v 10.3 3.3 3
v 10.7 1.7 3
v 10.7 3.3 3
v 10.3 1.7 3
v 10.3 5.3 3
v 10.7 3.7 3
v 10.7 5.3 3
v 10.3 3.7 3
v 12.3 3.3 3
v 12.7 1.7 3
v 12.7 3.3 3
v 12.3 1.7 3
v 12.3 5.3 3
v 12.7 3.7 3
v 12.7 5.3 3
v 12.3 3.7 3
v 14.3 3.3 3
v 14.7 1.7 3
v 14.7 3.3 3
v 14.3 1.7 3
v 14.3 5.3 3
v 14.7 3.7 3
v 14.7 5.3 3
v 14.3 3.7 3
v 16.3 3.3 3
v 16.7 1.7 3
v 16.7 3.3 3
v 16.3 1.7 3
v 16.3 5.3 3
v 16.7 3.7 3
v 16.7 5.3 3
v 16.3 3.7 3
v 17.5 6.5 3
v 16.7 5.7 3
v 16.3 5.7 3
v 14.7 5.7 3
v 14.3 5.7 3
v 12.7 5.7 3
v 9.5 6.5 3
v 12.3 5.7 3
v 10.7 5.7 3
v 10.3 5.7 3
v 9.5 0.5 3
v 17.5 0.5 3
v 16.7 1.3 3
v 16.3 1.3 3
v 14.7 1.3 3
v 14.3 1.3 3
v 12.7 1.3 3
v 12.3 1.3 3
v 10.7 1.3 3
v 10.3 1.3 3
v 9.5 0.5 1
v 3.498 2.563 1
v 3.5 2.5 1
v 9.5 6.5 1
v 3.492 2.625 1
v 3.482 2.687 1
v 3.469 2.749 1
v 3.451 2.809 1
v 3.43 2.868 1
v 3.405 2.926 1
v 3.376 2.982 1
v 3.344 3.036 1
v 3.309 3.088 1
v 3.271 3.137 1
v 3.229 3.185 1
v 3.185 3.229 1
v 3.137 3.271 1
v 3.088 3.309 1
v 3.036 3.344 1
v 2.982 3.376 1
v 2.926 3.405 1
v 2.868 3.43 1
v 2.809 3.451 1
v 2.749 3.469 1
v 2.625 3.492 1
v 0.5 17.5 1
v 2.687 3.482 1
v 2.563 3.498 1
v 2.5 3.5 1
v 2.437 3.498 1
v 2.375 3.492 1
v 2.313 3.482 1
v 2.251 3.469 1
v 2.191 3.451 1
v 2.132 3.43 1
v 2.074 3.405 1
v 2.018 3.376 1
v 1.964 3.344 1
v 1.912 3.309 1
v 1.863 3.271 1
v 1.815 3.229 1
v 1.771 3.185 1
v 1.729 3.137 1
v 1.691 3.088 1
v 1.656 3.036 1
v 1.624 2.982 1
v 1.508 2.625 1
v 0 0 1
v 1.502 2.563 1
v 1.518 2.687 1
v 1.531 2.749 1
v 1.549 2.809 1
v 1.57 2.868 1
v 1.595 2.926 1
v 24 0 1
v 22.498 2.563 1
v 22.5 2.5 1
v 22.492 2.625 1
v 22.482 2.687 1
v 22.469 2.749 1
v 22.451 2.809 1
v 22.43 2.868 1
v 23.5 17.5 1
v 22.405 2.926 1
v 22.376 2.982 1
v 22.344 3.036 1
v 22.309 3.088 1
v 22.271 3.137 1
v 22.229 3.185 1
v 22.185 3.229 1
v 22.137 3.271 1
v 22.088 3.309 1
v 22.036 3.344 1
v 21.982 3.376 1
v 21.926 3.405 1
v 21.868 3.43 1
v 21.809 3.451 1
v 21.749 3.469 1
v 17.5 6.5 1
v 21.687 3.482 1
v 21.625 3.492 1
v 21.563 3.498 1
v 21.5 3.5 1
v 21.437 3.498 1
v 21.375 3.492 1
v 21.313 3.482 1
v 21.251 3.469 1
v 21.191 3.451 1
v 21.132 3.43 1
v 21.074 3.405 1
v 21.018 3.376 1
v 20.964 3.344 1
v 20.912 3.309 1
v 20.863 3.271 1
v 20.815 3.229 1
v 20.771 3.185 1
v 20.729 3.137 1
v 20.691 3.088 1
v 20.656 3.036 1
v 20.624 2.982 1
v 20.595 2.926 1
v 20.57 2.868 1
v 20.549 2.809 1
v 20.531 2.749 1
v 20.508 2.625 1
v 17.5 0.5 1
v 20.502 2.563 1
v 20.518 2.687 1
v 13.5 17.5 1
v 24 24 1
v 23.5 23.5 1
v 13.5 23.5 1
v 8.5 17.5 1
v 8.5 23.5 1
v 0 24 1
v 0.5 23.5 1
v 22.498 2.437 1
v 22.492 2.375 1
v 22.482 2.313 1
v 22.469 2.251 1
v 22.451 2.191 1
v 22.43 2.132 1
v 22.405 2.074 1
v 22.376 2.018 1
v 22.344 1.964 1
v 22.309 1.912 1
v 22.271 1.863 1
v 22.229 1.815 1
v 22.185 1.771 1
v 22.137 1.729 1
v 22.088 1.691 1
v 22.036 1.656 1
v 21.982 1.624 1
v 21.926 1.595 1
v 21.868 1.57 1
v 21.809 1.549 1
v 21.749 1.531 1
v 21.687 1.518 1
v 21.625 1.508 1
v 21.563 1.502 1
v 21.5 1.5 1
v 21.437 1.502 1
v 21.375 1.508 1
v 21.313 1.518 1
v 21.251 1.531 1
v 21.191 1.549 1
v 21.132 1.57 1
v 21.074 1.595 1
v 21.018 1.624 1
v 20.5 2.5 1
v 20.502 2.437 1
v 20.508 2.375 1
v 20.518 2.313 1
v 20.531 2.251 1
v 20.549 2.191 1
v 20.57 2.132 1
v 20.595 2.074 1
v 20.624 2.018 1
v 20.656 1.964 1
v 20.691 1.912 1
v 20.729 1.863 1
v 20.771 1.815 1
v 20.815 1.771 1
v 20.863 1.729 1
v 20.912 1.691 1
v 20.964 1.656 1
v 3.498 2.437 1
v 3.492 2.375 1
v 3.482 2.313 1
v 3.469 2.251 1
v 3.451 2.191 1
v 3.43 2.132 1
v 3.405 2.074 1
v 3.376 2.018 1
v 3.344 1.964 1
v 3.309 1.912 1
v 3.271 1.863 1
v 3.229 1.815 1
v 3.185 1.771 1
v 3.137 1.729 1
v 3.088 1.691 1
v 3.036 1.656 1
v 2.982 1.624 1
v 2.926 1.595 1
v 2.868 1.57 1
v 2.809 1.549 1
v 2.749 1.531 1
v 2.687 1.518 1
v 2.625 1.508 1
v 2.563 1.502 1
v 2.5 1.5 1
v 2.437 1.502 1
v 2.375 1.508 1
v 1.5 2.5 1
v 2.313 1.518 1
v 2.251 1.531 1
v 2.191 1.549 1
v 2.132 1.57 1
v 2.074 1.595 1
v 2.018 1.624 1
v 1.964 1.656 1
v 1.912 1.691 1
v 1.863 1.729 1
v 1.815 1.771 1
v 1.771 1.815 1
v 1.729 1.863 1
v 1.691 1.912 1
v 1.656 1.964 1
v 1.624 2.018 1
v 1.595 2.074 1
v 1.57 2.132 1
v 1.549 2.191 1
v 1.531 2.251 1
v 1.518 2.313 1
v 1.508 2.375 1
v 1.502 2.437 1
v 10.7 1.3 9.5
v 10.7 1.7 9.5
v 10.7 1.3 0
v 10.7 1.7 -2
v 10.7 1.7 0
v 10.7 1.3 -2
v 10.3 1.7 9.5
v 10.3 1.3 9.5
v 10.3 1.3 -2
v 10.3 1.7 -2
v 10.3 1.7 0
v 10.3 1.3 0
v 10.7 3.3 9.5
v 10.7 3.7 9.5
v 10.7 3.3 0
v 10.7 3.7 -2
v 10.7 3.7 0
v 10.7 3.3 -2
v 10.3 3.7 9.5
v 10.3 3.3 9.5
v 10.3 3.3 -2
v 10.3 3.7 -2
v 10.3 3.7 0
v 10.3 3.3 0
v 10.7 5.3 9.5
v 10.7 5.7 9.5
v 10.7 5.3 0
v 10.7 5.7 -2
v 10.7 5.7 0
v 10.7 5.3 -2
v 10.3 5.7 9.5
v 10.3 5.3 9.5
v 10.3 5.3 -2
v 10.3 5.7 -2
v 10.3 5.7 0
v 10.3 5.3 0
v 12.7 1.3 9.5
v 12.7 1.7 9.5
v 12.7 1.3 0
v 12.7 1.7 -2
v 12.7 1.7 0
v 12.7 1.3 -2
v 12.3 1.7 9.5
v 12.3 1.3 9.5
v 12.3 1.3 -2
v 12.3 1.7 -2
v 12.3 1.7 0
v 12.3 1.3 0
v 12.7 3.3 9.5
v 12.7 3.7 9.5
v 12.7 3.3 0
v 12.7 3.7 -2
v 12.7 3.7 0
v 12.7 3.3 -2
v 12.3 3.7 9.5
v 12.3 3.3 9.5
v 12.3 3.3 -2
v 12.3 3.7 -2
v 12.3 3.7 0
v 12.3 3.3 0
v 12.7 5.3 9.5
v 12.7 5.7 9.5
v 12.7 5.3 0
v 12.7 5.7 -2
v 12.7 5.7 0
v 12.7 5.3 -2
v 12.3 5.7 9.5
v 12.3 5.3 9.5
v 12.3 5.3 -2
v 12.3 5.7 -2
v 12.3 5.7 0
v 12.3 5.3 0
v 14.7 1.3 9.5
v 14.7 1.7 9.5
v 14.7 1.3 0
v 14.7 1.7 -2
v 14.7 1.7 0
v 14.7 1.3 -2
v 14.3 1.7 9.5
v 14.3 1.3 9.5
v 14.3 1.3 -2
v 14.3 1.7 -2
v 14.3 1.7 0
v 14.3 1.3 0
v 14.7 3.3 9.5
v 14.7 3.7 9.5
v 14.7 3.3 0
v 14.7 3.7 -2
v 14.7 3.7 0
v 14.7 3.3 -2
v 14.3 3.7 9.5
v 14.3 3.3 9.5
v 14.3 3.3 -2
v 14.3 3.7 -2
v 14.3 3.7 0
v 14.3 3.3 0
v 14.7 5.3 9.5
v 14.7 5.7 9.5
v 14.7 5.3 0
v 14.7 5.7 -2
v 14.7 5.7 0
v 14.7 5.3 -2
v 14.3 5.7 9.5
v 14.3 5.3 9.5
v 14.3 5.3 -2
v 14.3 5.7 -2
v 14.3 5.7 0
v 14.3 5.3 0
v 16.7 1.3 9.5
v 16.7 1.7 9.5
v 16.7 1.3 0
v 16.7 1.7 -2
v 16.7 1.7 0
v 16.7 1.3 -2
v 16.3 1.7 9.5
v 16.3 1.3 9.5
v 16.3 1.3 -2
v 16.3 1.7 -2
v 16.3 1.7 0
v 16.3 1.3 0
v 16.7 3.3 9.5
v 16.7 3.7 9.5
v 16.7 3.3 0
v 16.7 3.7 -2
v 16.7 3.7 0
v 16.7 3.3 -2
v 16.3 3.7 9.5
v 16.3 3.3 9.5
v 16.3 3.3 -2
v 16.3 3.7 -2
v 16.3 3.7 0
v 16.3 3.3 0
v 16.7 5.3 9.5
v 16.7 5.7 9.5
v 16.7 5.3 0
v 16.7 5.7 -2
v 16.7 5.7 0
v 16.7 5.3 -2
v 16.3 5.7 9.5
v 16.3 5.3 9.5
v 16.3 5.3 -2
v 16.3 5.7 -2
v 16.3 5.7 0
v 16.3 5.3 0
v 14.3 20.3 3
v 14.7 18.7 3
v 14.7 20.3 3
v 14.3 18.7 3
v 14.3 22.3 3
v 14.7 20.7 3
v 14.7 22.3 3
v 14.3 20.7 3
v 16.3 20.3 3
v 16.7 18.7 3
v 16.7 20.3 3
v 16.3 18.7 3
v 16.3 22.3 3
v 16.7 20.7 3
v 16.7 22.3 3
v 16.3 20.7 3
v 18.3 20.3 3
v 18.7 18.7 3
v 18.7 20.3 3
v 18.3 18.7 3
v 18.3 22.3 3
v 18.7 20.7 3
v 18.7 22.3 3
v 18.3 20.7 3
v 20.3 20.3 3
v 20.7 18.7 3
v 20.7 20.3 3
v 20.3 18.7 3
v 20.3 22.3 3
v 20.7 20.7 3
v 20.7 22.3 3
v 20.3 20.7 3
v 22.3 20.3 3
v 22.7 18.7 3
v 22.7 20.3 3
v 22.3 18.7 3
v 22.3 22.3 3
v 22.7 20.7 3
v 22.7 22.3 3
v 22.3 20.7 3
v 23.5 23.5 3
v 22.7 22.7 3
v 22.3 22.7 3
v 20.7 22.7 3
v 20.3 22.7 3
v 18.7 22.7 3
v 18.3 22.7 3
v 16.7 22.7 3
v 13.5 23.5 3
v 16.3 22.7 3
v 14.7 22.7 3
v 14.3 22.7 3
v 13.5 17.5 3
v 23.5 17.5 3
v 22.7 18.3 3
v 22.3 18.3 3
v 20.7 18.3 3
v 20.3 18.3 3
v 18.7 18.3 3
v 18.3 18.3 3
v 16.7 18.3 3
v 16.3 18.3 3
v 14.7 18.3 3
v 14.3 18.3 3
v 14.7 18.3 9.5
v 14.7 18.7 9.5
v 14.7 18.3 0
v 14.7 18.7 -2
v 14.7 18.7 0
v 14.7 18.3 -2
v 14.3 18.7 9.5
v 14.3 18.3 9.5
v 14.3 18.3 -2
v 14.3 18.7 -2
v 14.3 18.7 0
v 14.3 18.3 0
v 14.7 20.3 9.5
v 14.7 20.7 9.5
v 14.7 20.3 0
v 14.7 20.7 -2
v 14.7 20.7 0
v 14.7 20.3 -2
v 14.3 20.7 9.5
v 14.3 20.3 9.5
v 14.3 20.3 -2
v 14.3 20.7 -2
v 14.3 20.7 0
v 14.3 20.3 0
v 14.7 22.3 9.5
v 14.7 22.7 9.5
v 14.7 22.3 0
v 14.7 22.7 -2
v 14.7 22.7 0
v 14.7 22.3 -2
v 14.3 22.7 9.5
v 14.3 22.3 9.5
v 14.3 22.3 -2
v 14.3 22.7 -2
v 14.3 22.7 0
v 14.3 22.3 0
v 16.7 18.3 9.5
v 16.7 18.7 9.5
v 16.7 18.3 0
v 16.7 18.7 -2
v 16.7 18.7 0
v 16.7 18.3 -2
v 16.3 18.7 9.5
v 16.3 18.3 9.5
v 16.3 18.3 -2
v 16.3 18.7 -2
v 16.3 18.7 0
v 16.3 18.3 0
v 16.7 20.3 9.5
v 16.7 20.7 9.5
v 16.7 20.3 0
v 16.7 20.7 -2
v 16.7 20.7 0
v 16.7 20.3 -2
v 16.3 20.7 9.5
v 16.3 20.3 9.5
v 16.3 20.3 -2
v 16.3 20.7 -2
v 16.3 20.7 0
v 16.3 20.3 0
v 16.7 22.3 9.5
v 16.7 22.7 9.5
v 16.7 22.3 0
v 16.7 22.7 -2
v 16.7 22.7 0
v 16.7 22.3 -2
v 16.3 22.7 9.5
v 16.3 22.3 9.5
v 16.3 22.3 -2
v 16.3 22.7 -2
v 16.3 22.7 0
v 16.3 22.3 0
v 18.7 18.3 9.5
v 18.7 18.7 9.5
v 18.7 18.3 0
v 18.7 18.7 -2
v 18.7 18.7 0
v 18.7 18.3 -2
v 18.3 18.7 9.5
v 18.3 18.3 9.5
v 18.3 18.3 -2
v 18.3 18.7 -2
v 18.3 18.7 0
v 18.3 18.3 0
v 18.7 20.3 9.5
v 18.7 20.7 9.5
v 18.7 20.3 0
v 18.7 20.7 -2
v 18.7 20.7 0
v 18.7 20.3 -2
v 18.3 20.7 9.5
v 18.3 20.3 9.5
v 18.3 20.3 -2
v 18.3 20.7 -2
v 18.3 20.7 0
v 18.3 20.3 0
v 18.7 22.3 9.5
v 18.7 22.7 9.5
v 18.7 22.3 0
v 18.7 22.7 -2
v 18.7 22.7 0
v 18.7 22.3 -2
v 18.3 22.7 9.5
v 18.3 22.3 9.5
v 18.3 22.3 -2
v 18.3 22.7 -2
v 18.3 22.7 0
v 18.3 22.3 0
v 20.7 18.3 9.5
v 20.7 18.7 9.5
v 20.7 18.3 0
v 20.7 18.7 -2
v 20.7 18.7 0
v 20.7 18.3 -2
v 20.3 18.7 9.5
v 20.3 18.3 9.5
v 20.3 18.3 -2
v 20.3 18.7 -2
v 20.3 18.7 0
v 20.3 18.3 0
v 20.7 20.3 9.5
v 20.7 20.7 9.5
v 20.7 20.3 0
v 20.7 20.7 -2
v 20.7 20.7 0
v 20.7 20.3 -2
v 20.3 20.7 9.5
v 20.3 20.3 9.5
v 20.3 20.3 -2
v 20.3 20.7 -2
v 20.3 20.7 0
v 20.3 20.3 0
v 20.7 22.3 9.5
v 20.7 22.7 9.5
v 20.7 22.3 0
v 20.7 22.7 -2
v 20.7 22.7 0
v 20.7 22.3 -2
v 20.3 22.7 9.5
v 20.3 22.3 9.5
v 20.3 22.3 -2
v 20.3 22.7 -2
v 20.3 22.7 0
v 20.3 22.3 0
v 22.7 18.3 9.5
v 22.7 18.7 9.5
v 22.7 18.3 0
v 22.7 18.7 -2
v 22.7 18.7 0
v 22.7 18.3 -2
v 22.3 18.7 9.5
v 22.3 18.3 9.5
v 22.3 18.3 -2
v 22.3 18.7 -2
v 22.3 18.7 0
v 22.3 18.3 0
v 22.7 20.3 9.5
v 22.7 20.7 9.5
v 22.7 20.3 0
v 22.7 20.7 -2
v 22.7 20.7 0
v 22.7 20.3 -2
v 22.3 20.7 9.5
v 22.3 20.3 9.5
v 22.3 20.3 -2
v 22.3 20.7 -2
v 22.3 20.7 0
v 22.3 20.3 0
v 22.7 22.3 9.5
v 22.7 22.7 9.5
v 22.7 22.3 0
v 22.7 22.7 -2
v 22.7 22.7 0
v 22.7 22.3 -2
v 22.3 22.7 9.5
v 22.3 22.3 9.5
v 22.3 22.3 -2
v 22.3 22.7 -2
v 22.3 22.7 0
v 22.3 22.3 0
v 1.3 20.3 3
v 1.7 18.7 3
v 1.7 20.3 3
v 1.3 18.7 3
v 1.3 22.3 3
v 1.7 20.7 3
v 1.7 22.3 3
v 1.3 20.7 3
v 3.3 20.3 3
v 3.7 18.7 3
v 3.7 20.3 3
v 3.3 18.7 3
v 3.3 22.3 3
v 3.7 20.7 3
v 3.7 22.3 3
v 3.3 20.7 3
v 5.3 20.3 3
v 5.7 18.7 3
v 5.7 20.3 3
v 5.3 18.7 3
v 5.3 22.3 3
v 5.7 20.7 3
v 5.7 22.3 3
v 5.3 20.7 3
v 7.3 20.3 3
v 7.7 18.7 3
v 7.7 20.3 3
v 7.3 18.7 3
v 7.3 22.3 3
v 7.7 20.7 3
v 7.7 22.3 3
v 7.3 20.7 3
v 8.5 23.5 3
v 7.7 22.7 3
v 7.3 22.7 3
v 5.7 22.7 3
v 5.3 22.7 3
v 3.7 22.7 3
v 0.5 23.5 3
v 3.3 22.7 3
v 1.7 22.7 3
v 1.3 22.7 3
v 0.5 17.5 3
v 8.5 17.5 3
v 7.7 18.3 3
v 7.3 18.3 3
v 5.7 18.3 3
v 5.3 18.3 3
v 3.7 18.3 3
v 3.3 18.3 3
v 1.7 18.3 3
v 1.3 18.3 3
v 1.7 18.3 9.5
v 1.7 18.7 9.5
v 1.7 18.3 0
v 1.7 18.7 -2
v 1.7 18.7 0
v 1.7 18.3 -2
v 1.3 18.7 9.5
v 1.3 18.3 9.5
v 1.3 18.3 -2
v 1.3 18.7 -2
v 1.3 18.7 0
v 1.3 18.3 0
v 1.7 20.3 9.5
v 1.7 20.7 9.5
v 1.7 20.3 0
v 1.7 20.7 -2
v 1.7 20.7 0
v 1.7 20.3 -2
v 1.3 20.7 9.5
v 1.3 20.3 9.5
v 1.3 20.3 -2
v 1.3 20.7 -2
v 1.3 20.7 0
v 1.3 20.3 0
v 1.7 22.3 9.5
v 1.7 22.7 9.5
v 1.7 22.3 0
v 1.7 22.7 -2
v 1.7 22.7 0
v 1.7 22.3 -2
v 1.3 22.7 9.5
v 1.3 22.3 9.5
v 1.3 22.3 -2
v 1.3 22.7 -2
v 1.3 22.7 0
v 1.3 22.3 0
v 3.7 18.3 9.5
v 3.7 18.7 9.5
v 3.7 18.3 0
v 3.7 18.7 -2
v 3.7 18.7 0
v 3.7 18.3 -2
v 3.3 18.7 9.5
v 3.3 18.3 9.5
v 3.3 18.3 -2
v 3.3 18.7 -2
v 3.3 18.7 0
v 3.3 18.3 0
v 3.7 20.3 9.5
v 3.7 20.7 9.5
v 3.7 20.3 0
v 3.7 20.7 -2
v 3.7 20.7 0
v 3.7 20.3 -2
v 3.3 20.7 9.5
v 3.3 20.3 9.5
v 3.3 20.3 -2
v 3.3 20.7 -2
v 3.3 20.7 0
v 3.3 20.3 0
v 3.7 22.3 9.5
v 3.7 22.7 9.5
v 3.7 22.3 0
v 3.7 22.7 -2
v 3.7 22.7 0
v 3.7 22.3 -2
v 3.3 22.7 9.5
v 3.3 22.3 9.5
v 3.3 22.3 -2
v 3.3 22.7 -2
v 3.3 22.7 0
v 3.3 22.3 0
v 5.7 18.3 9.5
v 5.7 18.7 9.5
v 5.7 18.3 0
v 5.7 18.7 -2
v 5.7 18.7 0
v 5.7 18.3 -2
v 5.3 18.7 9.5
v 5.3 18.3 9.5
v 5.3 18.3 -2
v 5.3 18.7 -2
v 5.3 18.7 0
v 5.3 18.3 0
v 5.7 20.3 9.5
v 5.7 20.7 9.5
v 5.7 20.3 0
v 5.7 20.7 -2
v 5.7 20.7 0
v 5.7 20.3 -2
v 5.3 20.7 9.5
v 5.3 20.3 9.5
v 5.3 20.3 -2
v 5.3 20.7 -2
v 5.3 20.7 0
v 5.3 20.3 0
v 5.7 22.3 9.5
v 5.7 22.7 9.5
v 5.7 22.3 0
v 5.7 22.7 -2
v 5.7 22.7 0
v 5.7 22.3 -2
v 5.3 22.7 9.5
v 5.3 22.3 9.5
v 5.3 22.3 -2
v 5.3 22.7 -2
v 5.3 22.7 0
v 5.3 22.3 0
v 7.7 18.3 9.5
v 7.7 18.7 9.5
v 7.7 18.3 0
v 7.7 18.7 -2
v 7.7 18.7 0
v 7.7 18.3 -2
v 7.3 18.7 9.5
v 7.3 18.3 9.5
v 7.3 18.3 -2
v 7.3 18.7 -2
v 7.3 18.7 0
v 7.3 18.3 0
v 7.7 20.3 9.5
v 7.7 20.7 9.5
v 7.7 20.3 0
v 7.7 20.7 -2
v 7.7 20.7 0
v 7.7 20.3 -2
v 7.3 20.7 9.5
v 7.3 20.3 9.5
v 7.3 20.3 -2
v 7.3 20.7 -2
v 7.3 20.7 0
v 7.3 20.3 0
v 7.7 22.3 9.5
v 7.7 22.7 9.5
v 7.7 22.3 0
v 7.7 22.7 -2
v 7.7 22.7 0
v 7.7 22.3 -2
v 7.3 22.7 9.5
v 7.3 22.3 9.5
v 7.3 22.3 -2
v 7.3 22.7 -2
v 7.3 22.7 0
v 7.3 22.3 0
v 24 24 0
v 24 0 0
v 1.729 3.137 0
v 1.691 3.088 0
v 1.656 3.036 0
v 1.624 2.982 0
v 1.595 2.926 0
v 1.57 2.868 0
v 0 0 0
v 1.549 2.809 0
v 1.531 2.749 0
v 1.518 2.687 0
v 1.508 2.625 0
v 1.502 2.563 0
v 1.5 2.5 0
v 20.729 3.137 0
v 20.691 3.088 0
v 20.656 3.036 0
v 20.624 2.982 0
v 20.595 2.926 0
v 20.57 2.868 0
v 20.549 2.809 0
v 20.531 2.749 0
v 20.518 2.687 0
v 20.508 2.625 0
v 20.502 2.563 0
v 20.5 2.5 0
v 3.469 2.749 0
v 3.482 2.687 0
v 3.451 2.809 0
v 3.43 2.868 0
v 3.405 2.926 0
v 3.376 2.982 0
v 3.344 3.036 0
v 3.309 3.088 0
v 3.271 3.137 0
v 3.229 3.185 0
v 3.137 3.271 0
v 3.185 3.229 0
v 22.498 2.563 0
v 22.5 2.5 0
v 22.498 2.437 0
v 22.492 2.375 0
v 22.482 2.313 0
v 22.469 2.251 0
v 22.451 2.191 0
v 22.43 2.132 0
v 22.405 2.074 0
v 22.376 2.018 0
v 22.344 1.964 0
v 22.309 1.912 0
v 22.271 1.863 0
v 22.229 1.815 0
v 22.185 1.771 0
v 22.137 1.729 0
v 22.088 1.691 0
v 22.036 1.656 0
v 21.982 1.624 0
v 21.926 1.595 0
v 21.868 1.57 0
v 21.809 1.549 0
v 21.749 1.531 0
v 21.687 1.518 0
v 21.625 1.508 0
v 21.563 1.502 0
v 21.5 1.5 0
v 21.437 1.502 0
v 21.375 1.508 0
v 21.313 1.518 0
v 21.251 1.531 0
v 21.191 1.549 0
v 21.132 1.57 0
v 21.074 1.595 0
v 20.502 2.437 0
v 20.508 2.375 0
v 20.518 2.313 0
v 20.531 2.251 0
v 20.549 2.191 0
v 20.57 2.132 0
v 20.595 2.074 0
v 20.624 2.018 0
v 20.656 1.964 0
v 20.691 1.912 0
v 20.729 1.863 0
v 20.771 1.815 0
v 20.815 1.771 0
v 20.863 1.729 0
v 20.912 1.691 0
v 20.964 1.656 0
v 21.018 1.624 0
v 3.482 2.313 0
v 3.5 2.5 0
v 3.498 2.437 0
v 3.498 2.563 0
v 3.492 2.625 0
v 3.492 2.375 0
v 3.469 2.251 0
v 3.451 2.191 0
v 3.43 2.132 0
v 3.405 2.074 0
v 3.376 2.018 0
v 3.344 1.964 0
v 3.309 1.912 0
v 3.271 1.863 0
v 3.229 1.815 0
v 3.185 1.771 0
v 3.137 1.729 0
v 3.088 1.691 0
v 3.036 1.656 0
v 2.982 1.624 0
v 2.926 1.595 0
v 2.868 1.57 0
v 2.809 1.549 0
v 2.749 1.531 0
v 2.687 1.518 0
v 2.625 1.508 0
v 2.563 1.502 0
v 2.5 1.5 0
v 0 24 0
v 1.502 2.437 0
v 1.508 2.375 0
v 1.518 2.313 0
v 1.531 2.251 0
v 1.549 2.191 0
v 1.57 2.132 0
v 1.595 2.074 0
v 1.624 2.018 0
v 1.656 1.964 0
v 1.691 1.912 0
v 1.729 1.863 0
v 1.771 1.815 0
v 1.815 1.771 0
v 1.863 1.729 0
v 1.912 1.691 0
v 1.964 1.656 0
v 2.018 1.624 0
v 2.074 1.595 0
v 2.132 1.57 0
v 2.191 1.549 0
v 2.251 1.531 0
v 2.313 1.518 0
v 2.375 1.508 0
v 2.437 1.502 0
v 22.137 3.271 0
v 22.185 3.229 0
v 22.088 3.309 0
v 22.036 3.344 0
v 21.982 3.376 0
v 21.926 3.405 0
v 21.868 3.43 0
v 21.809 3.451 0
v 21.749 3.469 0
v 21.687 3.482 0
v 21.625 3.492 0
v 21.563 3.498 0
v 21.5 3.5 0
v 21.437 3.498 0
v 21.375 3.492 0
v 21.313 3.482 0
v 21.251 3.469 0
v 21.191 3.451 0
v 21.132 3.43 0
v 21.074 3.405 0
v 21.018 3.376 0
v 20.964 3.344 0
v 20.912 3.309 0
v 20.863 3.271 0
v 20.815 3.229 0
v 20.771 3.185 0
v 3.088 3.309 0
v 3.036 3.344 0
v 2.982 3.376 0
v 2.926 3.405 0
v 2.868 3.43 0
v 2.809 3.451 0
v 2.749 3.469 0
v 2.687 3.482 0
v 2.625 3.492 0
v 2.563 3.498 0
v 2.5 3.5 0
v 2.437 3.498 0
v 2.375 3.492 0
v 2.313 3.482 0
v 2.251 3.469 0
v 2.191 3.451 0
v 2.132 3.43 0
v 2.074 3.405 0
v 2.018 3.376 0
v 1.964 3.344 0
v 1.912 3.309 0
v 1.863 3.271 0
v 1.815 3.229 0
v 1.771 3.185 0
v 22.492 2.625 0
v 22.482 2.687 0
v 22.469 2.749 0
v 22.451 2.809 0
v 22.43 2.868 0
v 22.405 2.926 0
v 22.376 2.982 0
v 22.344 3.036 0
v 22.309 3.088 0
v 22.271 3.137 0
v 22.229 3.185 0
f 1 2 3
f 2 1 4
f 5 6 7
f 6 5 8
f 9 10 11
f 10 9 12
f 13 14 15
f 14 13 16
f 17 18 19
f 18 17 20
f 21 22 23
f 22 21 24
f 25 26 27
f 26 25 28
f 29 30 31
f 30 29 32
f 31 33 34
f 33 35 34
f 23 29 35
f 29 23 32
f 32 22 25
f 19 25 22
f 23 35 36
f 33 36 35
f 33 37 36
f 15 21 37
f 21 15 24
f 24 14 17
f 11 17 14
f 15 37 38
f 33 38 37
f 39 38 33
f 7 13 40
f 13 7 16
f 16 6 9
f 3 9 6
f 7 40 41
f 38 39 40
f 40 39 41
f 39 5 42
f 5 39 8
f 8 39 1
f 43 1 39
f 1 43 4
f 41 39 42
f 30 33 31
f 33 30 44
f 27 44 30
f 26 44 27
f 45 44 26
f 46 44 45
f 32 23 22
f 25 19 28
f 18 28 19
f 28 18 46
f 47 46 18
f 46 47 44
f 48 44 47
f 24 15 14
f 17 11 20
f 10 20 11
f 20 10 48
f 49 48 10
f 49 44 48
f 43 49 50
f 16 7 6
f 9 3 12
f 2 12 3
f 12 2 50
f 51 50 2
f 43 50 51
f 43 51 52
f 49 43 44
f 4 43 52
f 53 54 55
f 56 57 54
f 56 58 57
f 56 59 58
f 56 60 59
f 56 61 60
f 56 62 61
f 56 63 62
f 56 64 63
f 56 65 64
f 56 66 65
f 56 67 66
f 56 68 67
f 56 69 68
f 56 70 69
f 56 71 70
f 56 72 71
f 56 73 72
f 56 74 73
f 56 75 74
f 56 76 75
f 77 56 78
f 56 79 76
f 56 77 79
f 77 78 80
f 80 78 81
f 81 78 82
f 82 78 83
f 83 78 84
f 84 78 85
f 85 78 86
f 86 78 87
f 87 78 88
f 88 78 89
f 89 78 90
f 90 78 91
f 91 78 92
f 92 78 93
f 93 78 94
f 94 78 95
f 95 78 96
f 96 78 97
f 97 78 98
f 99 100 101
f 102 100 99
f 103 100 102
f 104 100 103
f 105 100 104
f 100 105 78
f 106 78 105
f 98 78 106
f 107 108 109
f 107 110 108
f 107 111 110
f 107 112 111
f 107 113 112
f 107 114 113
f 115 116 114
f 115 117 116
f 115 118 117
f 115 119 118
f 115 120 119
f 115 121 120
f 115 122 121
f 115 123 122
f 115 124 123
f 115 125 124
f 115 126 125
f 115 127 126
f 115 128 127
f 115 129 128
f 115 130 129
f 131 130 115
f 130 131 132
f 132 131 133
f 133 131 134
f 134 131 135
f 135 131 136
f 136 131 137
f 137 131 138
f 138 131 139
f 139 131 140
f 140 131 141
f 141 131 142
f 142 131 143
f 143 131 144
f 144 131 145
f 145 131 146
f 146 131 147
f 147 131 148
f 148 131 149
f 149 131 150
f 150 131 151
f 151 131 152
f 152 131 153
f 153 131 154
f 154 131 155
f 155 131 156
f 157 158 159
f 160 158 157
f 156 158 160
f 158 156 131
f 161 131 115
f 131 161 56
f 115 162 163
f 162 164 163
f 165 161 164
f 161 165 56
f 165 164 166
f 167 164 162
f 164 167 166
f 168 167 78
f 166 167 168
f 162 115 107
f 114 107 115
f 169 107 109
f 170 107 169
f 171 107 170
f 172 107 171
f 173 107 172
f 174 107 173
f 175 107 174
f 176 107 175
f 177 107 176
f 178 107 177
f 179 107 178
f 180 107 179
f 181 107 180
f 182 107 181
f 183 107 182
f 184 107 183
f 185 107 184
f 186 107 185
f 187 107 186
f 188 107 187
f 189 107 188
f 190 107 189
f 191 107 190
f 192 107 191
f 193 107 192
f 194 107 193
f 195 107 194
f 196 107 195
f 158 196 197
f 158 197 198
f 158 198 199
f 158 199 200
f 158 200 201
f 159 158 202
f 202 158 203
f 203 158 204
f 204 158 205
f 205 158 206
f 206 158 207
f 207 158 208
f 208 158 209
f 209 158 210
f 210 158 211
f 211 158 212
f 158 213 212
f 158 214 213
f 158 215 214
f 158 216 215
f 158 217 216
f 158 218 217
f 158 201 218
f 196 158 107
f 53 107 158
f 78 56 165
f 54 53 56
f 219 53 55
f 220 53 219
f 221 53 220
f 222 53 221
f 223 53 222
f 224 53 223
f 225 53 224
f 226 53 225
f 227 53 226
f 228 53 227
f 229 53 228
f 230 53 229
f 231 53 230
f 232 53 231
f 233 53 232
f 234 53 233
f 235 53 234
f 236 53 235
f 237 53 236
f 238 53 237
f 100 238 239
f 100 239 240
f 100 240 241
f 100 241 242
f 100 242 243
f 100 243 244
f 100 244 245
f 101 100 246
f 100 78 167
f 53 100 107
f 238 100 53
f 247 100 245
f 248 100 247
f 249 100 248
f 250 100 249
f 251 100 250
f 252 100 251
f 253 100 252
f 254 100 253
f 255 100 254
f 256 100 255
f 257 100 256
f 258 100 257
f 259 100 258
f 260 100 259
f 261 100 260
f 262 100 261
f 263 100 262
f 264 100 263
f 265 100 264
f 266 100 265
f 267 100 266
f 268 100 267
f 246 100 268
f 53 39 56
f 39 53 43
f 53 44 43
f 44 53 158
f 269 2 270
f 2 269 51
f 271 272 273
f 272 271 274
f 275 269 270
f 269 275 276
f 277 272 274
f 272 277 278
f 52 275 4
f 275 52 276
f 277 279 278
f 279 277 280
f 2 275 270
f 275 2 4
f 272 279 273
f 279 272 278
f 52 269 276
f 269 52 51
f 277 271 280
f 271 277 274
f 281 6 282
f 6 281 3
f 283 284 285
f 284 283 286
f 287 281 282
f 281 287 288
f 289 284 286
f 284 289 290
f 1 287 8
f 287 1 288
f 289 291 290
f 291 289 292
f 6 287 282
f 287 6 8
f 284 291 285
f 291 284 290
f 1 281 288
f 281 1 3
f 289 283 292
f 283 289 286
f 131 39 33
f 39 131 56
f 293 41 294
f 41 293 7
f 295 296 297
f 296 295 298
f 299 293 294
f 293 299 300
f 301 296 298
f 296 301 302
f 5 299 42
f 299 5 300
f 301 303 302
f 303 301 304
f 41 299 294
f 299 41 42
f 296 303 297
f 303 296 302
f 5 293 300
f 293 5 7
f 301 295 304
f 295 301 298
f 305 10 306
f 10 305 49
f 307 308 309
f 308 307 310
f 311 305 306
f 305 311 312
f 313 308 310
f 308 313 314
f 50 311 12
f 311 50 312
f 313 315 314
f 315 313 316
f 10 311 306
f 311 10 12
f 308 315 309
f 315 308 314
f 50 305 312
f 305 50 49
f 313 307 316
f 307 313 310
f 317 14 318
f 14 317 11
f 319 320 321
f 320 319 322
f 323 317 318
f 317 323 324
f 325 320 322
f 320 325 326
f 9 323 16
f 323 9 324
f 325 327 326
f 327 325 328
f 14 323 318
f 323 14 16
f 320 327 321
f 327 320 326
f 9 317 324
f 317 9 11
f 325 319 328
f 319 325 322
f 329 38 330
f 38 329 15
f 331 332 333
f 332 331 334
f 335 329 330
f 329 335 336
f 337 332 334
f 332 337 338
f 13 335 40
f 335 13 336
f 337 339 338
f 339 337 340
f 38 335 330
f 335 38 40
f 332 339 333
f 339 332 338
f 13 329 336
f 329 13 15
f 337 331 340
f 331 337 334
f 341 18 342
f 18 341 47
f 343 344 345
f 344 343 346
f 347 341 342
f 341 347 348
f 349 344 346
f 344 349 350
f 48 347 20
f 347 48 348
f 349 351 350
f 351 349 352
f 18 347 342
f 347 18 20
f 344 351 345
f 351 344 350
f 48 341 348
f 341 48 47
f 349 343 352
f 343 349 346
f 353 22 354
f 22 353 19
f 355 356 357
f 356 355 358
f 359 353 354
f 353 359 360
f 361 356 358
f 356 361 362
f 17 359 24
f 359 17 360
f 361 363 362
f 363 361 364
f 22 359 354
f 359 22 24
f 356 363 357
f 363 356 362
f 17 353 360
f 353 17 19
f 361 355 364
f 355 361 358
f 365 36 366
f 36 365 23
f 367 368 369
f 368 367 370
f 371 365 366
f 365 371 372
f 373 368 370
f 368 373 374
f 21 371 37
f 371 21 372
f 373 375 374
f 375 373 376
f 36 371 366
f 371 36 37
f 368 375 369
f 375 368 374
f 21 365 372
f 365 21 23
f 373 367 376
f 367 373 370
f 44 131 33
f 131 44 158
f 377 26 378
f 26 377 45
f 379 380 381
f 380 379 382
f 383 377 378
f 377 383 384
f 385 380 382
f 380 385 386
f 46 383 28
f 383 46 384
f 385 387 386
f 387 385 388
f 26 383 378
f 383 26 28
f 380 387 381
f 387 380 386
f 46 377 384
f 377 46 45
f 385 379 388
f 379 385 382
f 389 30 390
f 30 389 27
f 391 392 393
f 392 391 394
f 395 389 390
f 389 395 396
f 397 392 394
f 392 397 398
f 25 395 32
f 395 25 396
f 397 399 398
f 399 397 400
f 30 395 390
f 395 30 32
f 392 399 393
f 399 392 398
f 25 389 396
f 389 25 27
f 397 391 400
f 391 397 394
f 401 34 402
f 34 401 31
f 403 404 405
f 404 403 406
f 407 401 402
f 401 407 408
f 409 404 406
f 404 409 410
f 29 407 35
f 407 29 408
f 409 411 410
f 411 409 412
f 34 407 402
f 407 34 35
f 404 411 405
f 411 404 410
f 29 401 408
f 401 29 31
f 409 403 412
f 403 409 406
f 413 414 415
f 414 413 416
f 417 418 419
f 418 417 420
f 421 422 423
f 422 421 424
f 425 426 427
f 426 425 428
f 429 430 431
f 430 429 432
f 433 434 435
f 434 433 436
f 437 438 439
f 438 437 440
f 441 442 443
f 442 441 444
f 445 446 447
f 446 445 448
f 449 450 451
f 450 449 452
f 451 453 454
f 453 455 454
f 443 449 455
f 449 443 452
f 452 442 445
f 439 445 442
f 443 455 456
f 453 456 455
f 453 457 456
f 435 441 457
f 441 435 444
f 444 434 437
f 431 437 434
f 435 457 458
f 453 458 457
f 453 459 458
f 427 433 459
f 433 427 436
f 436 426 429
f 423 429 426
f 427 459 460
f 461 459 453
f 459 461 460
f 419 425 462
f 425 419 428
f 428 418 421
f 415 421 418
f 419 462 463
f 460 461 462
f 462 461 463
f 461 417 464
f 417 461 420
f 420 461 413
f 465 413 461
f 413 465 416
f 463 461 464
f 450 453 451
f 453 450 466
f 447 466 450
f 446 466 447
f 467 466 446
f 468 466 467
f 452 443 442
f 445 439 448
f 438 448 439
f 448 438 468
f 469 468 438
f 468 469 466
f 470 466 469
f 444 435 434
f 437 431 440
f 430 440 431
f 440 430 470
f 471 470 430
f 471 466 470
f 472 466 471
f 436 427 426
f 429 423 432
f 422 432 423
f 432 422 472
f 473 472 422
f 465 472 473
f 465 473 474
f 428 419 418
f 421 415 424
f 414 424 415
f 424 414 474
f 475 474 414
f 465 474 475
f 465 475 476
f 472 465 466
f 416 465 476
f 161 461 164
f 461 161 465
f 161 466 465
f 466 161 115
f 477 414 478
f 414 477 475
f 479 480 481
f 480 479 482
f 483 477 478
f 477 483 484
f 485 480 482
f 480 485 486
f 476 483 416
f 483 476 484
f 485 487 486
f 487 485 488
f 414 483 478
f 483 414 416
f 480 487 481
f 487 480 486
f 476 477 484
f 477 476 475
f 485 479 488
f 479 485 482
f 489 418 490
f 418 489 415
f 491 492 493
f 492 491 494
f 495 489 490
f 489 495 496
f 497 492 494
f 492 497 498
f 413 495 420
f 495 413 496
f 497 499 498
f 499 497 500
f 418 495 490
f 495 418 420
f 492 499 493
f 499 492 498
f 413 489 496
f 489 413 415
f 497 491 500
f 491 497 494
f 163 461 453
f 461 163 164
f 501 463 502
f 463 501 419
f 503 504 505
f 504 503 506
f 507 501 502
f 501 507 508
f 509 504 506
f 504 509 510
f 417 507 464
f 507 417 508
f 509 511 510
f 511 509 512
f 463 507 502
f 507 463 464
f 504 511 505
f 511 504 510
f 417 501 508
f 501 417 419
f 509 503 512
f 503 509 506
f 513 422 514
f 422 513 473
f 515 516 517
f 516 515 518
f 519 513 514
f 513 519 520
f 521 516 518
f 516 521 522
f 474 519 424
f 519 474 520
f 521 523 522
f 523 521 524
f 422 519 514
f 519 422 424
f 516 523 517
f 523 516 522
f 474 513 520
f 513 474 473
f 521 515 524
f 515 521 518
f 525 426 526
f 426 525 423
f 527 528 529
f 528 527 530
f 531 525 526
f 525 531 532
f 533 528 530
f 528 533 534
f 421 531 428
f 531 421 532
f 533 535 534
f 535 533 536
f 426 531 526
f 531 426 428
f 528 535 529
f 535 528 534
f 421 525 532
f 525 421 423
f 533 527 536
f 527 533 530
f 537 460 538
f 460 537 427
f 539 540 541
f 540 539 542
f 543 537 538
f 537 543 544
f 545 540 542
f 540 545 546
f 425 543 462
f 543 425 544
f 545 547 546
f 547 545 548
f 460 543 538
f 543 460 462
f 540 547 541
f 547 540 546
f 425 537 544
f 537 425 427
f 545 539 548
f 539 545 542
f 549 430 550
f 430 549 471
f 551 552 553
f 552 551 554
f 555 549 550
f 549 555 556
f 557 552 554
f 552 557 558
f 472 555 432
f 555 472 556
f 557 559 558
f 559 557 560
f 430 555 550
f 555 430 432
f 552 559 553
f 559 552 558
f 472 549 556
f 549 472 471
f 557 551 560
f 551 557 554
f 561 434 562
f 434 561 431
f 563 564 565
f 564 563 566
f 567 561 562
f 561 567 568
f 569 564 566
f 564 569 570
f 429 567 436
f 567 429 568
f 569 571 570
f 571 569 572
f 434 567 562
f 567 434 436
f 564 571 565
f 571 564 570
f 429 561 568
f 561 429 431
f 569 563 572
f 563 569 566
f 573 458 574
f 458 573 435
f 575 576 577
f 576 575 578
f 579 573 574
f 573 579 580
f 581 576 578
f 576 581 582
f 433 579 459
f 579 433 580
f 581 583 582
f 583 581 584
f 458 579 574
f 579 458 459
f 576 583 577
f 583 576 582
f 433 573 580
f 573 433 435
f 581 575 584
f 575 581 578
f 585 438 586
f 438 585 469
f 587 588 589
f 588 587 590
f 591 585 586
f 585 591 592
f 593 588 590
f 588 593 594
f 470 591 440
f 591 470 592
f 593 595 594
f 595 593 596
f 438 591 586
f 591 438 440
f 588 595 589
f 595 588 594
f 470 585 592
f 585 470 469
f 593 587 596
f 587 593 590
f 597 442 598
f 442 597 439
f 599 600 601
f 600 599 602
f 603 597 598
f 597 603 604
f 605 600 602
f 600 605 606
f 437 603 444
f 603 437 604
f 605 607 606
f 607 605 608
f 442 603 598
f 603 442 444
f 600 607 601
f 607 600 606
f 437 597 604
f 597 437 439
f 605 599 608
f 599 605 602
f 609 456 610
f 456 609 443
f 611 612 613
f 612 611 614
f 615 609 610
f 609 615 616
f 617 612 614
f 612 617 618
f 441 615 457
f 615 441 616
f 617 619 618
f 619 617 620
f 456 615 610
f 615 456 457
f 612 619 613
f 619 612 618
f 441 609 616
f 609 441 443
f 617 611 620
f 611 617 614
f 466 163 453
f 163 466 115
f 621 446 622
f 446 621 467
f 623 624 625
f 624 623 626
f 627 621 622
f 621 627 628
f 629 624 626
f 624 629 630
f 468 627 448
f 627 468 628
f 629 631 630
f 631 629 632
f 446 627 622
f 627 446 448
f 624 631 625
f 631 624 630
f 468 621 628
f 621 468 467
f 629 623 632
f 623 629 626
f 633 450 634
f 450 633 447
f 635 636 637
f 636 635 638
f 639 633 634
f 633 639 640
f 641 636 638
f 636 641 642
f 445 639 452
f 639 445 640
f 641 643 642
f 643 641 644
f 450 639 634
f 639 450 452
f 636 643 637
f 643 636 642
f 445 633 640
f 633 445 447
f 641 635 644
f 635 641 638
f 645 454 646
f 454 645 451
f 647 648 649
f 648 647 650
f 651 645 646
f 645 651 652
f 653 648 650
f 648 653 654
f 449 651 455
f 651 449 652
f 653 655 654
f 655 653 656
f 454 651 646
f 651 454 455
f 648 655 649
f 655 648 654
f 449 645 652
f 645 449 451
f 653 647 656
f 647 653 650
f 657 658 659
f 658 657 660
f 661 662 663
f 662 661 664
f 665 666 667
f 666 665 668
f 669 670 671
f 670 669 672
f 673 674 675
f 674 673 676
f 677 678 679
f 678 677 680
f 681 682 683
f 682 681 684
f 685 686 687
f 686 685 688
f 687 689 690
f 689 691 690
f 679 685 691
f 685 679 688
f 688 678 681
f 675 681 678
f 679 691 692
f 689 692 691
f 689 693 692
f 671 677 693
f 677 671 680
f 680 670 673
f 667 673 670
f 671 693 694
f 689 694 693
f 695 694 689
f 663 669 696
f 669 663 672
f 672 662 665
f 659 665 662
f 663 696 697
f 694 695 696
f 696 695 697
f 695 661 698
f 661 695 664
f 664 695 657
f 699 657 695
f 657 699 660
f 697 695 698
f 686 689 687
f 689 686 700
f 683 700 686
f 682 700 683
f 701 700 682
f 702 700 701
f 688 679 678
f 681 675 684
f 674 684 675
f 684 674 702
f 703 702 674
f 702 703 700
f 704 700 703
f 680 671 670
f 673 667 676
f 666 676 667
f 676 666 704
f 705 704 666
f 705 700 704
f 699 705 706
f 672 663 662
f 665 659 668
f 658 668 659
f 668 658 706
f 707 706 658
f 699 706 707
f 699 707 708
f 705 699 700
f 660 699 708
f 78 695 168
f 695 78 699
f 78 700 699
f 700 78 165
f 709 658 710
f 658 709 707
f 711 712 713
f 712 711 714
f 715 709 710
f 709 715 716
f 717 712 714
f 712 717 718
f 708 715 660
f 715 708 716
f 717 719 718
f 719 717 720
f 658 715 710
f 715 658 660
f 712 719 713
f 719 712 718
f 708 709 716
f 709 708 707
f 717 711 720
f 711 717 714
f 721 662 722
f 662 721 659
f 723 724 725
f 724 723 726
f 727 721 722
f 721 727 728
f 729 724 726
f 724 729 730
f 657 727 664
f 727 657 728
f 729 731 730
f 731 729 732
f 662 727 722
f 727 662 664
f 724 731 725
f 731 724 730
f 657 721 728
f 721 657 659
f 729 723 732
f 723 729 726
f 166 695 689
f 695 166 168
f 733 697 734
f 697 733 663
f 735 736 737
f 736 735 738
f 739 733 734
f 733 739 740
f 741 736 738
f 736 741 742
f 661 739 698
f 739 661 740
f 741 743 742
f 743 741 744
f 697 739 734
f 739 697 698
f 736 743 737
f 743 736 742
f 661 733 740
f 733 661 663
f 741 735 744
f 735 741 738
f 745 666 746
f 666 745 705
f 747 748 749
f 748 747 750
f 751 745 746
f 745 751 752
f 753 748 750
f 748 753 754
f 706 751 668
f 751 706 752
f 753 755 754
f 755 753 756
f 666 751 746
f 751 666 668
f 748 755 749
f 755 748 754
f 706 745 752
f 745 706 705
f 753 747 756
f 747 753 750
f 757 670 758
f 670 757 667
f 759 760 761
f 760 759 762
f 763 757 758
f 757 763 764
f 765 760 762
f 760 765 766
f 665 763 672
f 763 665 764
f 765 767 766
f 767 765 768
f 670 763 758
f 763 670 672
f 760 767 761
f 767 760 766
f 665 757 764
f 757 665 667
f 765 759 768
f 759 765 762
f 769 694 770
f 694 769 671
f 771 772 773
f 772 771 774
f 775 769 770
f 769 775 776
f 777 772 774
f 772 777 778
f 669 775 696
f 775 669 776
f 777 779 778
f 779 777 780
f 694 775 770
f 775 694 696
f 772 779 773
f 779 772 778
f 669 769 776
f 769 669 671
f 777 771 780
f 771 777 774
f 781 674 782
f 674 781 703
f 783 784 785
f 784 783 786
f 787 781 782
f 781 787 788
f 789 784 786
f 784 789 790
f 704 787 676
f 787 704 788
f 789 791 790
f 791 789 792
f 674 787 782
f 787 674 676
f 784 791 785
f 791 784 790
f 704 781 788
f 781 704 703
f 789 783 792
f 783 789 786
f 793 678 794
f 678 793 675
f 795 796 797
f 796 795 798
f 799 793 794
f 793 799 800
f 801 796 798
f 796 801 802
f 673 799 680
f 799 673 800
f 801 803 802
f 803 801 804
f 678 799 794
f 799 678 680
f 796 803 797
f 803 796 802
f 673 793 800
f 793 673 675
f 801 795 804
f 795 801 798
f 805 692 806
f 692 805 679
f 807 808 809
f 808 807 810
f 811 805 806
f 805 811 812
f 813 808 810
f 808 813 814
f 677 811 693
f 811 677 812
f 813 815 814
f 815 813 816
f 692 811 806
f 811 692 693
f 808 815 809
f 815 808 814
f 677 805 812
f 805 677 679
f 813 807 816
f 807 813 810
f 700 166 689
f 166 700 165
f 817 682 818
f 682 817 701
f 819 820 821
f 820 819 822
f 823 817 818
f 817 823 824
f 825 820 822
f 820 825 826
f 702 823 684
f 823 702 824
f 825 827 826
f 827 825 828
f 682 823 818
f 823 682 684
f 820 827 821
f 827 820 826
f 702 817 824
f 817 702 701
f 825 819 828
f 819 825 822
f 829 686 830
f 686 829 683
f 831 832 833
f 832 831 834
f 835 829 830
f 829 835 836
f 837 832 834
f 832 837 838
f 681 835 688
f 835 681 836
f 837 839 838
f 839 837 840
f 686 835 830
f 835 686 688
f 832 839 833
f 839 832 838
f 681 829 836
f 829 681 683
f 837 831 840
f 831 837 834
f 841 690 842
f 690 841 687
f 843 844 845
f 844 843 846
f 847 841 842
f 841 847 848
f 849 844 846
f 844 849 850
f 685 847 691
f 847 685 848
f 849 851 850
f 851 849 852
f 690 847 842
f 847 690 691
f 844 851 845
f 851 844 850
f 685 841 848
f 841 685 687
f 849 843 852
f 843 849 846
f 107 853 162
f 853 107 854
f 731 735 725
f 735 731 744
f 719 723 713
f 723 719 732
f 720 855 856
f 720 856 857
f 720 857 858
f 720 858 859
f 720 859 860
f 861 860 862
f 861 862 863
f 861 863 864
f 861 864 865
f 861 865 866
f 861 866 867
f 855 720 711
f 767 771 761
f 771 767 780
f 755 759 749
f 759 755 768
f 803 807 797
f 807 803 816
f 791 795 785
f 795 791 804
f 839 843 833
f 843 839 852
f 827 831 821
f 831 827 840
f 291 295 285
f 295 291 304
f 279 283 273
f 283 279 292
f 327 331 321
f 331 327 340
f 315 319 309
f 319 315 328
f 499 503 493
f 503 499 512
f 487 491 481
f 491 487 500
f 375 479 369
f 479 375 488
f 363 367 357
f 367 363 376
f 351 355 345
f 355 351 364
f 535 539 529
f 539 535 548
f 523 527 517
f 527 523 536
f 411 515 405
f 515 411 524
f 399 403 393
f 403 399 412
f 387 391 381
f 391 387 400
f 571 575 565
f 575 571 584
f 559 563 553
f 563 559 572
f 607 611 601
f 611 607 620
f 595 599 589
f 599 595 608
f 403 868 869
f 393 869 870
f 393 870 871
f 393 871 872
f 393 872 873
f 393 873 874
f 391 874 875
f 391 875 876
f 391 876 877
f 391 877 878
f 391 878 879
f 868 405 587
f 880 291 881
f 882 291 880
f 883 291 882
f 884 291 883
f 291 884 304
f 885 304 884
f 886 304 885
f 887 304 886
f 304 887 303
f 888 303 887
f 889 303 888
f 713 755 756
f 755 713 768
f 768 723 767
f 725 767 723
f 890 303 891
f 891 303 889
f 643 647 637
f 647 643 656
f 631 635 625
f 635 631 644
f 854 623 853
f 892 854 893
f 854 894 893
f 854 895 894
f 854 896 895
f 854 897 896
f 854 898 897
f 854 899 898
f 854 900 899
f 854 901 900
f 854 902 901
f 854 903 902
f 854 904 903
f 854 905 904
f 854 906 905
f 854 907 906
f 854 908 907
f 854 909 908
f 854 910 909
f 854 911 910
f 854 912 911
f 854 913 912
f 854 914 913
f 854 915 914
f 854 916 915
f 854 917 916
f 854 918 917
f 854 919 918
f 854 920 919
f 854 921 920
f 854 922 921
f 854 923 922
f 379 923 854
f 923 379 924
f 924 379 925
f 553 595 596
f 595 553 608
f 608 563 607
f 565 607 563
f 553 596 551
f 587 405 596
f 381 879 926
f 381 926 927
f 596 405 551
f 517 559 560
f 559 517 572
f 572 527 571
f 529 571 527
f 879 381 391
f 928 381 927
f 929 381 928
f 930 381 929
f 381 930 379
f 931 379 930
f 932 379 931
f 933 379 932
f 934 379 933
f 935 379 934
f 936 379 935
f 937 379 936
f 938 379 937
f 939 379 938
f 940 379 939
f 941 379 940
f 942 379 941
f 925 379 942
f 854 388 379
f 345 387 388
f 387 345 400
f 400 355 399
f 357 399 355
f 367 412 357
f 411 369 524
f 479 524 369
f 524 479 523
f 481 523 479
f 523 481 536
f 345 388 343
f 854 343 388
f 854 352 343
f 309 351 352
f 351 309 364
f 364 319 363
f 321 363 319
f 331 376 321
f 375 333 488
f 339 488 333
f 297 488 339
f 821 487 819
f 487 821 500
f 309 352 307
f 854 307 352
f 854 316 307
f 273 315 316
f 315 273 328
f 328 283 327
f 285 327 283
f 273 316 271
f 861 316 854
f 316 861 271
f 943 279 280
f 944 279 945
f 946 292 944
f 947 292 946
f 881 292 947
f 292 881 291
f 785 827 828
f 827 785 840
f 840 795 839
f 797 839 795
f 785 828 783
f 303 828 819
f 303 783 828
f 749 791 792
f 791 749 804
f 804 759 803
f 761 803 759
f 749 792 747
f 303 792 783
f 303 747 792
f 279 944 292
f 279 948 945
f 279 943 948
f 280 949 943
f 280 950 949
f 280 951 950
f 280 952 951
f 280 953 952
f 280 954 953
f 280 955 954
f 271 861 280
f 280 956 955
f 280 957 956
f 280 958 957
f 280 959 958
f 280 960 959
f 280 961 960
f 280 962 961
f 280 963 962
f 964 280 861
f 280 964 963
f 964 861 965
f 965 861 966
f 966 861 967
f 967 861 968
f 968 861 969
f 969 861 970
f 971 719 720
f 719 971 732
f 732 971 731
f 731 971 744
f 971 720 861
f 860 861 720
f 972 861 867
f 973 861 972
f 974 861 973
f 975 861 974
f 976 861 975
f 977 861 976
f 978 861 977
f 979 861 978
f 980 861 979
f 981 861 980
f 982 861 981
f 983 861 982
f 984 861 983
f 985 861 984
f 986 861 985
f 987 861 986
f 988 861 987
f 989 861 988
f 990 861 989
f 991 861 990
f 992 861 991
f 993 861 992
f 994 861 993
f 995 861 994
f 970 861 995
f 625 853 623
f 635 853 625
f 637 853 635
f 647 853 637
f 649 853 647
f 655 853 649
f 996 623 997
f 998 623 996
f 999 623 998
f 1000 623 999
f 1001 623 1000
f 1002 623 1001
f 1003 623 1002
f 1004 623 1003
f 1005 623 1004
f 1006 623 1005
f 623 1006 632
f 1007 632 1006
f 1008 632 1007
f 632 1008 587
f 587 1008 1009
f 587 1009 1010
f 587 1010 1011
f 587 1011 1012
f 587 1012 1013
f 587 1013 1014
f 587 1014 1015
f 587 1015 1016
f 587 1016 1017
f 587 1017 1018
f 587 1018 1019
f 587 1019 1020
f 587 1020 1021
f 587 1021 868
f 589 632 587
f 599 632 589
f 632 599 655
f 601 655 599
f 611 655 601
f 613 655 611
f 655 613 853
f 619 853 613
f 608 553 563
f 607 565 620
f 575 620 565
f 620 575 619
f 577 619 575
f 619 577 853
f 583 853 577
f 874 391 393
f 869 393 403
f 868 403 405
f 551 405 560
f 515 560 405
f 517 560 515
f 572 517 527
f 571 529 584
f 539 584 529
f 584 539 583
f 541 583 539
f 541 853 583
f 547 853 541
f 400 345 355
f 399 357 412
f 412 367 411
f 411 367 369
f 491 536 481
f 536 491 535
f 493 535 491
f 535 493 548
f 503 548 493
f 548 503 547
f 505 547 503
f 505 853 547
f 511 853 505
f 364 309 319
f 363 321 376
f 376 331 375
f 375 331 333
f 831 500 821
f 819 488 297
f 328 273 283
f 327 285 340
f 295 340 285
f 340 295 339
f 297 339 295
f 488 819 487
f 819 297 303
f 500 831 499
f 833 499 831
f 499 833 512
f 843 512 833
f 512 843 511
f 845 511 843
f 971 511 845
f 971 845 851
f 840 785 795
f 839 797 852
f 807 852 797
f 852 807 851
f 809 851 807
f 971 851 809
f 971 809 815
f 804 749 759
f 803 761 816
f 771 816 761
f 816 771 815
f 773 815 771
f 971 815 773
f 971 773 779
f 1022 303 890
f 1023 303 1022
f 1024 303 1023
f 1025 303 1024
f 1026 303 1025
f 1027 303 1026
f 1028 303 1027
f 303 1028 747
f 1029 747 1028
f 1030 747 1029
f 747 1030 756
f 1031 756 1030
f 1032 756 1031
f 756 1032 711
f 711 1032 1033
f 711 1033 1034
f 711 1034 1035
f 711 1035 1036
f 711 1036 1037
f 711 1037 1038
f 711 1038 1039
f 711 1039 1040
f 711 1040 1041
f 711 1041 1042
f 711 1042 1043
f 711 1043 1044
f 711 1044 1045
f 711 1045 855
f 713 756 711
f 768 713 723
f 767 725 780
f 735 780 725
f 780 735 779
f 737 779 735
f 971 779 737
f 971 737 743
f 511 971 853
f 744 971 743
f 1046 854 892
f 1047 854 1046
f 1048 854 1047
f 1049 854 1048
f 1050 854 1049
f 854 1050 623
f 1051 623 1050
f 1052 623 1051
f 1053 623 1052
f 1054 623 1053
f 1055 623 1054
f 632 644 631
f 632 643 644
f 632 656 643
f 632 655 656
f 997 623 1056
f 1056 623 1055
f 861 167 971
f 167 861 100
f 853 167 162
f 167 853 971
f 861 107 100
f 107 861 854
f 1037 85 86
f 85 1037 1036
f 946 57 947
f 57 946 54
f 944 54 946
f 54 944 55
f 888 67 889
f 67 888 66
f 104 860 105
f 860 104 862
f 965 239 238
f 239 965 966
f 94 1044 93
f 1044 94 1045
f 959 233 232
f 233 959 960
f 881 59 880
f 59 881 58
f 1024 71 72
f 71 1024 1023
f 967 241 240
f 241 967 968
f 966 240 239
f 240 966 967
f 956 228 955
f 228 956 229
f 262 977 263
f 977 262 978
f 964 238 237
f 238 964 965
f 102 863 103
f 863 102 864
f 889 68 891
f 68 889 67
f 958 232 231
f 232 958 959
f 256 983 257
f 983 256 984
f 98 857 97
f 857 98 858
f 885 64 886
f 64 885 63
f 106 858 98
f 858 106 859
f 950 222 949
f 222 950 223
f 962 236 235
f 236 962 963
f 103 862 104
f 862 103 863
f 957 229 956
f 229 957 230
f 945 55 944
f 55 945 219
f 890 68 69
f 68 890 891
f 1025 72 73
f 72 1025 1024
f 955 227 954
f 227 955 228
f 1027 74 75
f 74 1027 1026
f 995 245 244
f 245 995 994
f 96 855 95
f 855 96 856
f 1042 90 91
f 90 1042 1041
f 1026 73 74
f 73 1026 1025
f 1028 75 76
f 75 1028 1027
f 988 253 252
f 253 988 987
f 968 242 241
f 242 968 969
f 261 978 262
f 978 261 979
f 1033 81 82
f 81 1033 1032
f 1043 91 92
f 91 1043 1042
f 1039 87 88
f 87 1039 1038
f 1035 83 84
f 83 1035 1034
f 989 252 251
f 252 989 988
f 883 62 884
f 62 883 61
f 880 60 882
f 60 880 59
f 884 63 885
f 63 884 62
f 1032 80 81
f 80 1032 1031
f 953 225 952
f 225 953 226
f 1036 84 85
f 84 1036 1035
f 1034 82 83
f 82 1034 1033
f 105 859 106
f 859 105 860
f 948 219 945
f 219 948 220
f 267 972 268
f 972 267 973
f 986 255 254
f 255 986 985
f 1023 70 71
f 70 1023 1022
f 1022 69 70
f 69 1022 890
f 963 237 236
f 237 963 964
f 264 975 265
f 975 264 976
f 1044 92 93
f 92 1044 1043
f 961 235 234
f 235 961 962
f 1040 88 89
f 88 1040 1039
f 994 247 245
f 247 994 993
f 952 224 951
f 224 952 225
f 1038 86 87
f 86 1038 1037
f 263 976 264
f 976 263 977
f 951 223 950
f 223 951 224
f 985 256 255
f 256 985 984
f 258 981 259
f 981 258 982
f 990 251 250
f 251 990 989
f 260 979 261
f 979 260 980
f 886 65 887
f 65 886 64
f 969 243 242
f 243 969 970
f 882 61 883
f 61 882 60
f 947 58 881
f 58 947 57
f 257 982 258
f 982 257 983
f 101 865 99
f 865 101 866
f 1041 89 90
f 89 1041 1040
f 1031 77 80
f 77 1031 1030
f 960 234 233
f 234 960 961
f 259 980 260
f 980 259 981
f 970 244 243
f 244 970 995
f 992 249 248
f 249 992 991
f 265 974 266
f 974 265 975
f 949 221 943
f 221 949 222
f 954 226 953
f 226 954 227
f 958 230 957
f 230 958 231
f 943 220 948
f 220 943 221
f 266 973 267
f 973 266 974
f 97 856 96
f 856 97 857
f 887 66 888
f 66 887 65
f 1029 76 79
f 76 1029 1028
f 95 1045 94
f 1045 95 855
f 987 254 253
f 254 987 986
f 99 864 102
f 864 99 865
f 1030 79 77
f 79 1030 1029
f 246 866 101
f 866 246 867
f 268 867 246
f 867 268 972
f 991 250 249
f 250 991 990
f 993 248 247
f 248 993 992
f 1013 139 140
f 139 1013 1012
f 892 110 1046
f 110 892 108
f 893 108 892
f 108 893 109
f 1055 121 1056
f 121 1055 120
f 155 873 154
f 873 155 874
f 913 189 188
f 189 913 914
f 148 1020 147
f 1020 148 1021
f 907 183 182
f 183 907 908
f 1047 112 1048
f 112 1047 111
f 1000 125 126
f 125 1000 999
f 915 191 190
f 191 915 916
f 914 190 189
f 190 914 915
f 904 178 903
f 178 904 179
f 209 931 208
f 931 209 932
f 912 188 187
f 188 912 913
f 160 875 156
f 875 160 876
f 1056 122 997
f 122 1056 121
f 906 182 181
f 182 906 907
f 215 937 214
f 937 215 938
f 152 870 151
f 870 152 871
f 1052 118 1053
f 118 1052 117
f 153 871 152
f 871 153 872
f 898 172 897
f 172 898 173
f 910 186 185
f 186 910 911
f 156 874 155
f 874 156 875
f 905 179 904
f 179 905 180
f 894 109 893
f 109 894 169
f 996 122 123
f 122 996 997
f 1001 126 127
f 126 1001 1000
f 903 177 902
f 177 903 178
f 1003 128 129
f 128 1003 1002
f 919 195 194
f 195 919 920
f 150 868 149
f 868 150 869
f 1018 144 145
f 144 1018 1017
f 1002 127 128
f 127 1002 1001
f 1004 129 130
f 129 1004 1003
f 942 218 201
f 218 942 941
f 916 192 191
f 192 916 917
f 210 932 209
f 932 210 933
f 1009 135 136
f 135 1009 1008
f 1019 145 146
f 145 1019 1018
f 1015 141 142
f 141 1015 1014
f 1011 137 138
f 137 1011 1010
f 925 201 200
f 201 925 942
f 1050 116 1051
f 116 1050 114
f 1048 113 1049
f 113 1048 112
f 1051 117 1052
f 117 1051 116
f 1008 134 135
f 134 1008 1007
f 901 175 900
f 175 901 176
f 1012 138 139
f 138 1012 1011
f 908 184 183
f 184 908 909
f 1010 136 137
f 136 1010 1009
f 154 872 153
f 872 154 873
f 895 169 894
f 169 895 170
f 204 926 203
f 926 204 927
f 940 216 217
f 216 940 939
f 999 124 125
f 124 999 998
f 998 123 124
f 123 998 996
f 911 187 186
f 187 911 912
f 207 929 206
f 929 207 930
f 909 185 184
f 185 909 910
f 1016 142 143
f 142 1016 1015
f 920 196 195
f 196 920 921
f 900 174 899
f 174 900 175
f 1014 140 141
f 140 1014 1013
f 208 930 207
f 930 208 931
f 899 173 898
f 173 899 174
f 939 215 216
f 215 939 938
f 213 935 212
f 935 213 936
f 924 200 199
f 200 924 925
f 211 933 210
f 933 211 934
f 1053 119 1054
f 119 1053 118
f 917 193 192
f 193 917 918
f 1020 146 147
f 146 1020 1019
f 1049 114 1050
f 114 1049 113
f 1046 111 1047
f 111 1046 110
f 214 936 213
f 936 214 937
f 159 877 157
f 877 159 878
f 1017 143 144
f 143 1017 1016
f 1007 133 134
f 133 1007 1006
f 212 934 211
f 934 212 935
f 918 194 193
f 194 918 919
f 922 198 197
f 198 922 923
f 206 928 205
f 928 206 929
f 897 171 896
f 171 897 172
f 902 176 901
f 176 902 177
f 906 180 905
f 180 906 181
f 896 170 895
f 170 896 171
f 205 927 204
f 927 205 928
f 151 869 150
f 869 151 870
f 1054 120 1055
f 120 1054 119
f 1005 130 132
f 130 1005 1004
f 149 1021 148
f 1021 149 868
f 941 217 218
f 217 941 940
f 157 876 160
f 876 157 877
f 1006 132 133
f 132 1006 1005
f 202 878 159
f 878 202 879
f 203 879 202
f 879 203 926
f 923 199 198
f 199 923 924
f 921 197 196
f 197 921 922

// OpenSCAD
module pin(){
    cube([2,2,2]);
    translate([0.8,0.8,-3]) cube([0.4,0.4,11.5]);
    //translate([1,1,-3]) cylinder(h=11.5, d=0.8, $fn=100);
}

module pin_block(x,y){
    for (i = [0 : x-1]) {
        for (j = [0 : y-1]){
            translate([i*2, j*2]) pin();
        }
    }
}

module pololu_4_channel_multiplexer_assembled(){
    difference() {
        union(){
            cube([24,24,1]);
            translate([9.5,0.5,1]) pin_block(4,3);
            translate([13.5,17.5,1]) pin_block(5,3);
            translate([0.5,17.5,1]) pin_block(4,3);
        }
        translate([2.5,2.5, -0.1]) cylinder(h=2.2, d=2, $fn=100);
        translate([21.5,2.5, -0.1]) cylinder(h=2.2, d=2, $fn=100);
    }
}

pololu_4_channel_multiplexer_assembled();
